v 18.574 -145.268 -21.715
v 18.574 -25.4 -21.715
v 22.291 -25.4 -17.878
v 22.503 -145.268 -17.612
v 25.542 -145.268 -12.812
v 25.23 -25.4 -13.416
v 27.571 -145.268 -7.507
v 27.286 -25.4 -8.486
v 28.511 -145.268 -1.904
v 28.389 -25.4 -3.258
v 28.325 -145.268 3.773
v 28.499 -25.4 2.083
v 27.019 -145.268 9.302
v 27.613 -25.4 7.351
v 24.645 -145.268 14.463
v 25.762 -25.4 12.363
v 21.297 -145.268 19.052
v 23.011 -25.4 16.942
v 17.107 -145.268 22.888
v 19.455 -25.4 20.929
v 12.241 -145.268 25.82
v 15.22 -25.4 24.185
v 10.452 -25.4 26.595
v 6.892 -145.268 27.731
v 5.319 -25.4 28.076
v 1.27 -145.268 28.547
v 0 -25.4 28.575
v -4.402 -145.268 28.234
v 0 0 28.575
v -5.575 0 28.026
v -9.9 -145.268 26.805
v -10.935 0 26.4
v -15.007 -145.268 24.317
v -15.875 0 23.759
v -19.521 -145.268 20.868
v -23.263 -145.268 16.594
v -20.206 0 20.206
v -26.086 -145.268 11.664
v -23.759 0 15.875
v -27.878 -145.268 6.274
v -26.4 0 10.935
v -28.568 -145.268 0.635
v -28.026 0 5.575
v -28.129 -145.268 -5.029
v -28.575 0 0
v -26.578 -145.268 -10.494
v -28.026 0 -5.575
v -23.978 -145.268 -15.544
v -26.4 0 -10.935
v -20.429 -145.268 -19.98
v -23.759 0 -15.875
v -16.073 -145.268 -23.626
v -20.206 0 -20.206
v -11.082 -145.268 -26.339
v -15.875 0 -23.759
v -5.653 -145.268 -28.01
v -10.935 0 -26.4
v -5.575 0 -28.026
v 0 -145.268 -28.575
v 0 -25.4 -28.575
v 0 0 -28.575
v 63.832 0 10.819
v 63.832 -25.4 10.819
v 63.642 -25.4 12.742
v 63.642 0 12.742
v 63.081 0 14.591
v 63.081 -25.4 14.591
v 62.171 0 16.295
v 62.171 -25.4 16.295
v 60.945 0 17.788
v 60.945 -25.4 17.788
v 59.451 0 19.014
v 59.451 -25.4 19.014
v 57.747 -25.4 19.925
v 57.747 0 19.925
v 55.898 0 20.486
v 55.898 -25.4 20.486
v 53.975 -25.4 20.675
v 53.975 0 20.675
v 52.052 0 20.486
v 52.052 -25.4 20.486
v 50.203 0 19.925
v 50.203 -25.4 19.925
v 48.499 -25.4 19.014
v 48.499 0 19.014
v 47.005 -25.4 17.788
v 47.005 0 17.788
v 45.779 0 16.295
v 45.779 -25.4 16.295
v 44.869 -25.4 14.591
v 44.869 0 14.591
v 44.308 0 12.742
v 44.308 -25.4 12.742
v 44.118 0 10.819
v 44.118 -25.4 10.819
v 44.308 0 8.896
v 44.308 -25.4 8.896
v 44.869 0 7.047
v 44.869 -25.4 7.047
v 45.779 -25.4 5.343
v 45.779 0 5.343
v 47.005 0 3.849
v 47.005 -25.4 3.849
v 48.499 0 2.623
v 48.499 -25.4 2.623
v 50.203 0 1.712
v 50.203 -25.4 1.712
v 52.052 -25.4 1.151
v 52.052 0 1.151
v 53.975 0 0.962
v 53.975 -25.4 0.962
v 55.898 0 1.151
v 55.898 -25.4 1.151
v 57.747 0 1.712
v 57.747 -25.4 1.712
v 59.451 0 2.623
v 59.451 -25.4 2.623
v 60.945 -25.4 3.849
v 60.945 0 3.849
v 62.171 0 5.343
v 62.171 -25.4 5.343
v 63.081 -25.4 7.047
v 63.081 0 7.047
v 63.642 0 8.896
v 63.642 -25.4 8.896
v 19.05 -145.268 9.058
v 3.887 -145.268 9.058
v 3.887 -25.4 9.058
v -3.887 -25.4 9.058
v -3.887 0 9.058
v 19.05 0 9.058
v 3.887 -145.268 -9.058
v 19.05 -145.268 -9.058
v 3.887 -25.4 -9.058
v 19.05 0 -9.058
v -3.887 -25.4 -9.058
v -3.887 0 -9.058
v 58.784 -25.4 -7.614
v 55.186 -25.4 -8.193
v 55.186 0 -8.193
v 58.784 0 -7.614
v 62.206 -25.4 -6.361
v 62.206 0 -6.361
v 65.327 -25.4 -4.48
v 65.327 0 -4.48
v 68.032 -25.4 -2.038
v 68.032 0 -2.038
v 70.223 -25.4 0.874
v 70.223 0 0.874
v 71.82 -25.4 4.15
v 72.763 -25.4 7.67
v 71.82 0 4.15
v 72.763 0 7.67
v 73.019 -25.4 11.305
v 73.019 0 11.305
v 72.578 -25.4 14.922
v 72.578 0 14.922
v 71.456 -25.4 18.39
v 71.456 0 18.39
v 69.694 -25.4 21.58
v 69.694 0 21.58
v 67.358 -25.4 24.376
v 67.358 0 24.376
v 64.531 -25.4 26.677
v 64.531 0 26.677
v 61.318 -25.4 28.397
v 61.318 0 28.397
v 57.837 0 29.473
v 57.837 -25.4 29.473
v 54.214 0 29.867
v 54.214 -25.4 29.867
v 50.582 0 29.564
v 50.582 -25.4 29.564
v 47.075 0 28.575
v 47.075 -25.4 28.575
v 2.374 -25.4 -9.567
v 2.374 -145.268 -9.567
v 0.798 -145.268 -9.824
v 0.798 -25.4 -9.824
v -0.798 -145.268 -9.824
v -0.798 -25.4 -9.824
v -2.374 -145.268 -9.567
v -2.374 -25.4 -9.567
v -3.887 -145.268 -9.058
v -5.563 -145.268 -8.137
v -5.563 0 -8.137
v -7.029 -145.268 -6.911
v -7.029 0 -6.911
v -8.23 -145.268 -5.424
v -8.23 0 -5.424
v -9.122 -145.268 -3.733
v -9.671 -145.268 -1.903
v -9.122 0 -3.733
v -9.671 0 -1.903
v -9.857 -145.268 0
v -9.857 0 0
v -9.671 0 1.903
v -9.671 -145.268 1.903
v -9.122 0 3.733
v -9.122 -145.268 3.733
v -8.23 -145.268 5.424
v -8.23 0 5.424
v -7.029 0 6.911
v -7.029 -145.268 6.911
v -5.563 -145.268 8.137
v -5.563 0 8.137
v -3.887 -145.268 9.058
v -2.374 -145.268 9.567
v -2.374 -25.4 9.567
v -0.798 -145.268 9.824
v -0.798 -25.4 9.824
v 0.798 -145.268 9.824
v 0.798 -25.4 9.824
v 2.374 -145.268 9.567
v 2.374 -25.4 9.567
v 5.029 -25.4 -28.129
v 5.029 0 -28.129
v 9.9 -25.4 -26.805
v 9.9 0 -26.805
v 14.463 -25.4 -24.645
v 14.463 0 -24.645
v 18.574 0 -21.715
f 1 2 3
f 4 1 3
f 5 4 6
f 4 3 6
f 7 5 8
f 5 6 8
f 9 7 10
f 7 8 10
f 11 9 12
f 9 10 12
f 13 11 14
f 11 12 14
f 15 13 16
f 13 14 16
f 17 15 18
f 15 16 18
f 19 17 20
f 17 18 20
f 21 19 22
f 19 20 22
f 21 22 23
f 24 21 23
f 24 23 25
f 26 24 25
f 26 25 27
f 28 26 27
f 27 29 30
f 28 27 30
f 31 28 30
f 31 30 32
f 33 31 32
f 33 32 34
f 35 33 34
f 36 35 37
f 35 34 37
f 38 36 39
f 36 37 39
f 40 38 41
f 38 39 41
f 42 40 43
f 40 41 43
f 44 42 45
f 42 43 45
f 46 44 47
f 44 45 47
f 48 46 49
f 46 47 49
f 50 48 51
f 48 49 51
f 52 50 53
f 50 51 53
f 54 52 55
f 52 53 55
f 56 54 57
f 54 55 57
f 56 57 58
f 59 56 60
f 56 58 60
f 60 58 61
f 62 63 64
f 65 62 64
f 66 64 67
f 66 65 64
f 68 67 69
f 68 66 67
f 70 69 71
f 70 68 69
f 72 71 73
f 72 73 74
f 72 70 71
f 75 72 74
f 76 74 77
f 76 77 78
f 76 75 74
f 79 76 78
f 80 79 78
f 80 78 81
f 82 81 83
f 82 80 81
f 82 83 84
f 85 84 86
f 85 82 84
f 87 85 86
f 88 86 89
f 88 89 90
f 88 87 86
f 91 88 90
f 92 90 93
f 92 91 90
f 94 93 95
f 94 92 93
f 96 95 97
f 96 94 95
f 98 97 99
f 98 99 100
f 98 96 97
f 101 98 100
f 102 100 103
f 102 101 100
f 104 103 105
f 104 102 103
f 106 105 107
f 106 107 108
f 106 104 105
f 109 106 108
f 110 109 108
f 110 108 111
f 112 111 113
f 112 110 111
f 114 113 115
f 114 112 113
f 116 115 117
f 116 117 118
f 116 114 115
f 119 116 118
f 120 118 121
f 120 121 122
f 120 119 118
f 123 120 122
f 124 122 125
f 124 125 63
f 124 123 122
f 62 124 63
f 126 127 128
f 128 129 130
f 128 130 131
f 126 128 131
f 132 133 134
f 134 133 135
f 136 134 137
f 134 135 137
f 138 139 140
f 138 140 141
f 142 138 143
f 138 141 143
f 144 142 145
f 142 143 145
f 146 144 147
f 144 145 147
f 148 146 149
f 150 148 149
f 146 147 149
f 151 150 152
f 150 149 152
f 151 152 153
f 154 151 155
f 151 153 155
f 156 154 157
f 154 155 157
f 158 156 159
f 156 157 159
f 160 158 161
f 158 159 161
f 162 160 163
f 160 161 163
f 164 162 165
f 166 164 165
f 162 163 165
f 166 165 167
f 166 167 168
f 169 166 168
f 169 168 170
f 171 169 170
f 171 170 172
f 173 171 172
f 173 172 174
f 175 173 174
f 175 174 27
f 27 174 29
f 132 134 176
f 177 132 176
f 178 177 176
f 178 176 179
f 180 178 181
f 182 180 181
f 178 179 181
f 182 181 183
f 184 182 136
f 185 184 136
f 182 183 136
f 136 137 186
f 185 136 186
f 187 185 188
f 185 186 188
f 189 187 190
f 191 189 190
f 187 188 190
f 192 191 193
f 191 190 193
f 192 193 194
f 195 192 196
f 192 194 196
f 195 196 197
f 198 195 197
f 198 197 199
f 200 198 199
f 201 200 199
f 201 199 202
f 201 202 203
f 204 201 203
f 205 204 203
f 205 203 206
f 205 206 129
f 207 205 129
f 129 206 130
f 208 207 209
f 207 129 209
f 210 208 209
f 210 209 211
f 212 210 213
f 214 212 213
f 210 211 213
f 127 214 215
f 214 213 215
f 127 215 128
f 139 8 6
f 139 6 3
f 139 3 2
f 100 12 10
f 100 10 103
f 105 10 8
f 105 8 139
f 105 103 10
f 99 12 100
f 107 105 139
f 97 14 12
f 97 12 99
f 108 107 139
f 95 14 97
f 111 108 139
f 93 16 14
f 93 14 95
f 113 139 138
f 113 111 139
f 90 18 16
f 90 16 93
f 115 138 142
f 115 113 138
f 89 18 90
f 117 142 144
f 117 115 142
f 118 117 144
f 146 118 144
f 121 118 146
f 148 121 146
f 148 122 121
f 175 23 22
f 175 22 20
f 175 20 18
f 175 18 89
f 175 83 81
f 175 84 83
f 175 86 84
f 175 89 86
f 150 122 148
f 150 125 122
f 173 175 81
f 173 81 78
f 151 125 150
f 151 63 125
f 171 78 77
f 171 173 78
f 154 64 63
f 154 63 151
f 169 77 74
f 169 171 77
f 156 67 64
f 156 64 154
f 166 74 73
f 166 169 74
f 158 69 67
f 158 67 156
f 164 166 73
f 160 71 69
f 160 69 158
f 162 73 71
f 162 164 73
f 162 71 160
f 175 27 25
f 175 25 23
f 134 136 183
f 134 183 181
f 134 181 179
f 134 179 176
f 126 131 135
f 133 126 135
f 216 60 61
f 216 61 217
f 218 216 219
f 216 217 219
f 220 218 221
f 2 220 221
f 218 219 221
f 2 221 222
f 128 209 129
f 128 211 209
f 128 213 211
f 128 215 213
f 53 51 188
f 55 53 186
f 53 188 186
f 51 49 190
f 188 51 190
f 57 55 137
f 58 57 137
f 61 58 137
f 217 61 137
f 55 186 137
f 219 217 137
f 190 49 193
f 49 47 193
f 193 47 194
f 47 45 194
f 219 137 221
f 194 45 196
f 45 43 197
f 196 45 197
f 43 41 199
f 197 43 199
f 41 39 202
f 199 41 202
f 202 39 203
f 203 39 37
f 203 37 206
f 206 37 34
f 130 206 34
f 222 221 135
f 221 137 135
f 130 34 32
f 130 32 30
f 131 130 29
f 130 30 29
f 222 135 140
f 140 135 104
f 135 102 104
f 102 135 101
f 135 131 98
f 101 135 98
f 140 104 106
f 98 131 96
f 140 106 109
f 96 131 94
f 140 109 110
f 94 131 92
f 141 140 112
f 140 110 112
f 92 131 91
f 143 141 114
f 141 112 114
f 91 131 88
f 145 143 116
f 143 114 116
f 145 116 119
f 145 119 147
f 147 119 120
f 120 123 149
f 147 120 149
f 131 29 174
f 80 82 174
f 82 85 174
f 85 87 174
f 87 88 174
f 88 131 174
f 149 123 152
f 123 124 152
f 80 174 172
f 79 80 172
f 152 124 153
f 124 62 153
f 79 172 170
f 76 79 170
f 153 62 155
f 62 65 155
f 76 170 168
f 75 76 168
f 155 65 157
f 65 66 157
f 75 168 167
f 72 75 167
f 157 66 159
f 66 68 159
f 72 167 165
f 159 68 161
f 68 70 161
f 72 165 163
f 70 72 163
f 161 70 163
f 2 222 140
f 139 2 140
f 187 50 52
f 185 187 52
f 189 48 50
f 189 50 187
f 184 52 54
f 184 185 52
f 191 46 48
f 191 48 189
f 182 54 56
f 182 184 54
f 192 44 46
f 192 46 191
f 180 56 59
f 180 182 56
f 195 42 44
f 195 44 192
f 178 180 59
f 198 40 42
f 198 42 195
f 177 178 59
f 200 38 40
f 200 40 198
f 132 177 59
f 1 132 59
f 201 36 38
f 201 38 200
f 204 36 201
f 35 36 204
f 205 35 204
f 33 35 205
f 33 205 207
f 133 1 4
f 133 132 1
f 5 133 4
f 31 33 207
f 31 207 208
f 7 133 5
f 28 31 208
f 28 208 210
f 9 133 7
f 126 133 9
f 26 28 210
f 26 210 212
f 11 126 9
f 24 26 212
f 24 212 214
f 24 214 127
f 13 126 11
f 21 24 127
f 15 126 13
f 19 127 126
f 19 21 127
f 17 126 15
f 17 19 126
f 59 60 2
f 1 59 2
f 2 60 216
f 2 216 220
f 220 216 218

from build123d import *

# Parameters (mm, degrees)
F0_R     = 9.8568007518
F1_DEPTH = 25.4
F2_DEPTH = 145.2685


with BuildPart() as f1:
    # F0 (on Front) → F1 (new body)
    with BuildSketch(Plane.XZ):
        with BuildLine():
            ThreePointArc((18.574012772, -21.714895223), (25.954604986, -11.9536230918), (28.575, 0))
            ThreePointArc((28.575, 0), (20.2055762724, 20.2055762724), (0, 28.575))
            ThreePointArc((0, 28.575), (-28.575, 0), (0, -28.575))
            Line((0, -28.575), (18.574012772, -21.714895223))
        make_face()
        with BuildLine():
            ThreePointArc((-3.887280916, 9.0579008684), (0, 9.8568007518), (3.887280916, 9.0579008684))
            Line((3.887280916, 9.0579008684), (19.05, 9.0579008684))
            Line((19.05, 9.0579008684), (19.05, -9.0579008684))
            Line((19.05, -9.0579008684), (3.887280916, -9.0579008684))
            ThreePointArc((3.887280916, -9.0579008684), (0, -9.8568007518), (-3.887280916, -9.0579008684))
            Line((-3.887280916, -9.0579008684), (-19.05, -9.0579008684))
            Line((-19.05, -9.0579008684), (-19.05, 9.0579008684))
            Line((-19.05, 9.0579008684), (-3.887280916, 9.0579008684))
        make_face(mode=Mode.SUBTRACT)
        with BuildLine():
            ThreePointArc((0, 28.575), (20.2055762724, 20.2055762724), (28.575, 0))
            ThreePointArc((28.575, 0), (25.954604986, -11.9536230918), (18.574012772, -21.714895223))
            Line((18.574012772, -21.714895223), (55.185590913, -8.1928165434))
            ThreePointArc((55.185590913, -8.1928165434), (35.3722696716, 6.7149096533), (47.0745963207, 28.575))
            Line((47.0745963207, 28.575), (0, 28.575))
        make_face()
        with BuildLine():
            ThreePointArc((0, -28.575), (9.9001892407, -26.8051651366), (18.574012772, -21.714895223))
            Line((18.574012772, -21.714895223), (0, -28.575))
        make_face()
        with BuildLine():
            ThreePointArc((73.025, 10.81867918), (64.7325510668, 26.5405618613), (47.0745963207, 28.575))
            ThreePointArc((47.0745963207, 28.575), (35.3722696716, 6.7149096533), (55.185590913, -8.1928165434))
            ThreePointArc((55.185590913, -8.1928165434), (67.8668007633, -2.2166716612), (73.025, 10.81867918))
        make_face()
        with Locations((53.975, 10.81867918)):
            Circle(F0_R, mode=Mode.SUBTRACT)
        with BuildLine():
            Line((-3.887280916, 9.0579008684), (3.887280916, 9.0579008684))
            ThreePointArc((3.887280916, 9.0579008684), (0, 9.8568007518), (-3.887280916, 9.0579008684))
        make_face()
        with BuildLine():
            ThreePointArc((-3.887280916, -9.0579008684), (0, -9.8568007518), (3.887280916, -9.0579008684))
            Line((3.887280916, -9.0579008684), (-3.887280916, -9.0579008684))
        make_face()
        with BuildLine():
            ThreePointArc((-3.887280916, -9.0579008684), (-9.8568007518, 0), (-3.887280916, 9.0579008684))
            Line((-3.887280916, 9.0579008684), (-19.05, 9.0579008684))
            Line((-19.05, 9.0579008684), (-19.05, -9.0579008684))
            Line((-19.05, -9.0579008684), (-3.887280916, -9.0579008684))
        make_face()
    extrude(amount=F1_DEPTH)

    # F0 (on Front) → F2 (join)
    with BuildSketch(Plane.XZ):
        with BuildLine():
            ThreePointArc((18.574012772, -21.714895223), (25.954604986, -11.9536230918), (28.575, 0))
            ThreePointArc((28.575, 0), (20.2055762724, 20.2055762724), (0, 28.575))
            ThreePointArc((0, 28.575), (-28.575, 0), (0, -28.575))
            Line((0, -28.575), (18.574012772, -21.714895223))
        make_face()
        with BuildLine():
            ThreePointArc((-3.887280916, 9.0579008684), (0, 9.8568007518), (3.887280916, 9.0579008684))
            Line((3.887280916, 9.0579008684), (19.05, 9.0579008684))
            Line((19.05, 9.0579008684), (19.05, -9.0579008684))
            Line((19.05, -9.0579008684), (3.887280916, -9.0579008684))
            ThreePointArc((3.887280916, -9.0579008684), (0, -9.8568007518), (-3.887280916, -9.0579008684))
            Line((-3.887280916, -9.0579008684), (-19.05, -9.0579008684))
            Line((-19.05, -9.0579008684), (-19.05, 9.0579008684))
            Line((-19.05, 9.0579008684), (-3.887280916, 9.0579008684))
        make_face(mode=Mode.SUBTRACT)
        with BuildLine():
            ThreePointArc((-3.887280916, -9.0579008684), (-9.8568007518, 0), (-3.887280916, 9.0579008684))
            Line((-3.887280916, 9.0579008684), (-19.05, 9.0579008684))
            Line((-19.05, 9.0579008684), (-19.05, -9.0579008684))
            Line((-19.05, -9.0579008684), (-3.887280916, -9.0579008684))
        make_face()
    extrude(amount=F2_DEPTH)


solid = f1.part
